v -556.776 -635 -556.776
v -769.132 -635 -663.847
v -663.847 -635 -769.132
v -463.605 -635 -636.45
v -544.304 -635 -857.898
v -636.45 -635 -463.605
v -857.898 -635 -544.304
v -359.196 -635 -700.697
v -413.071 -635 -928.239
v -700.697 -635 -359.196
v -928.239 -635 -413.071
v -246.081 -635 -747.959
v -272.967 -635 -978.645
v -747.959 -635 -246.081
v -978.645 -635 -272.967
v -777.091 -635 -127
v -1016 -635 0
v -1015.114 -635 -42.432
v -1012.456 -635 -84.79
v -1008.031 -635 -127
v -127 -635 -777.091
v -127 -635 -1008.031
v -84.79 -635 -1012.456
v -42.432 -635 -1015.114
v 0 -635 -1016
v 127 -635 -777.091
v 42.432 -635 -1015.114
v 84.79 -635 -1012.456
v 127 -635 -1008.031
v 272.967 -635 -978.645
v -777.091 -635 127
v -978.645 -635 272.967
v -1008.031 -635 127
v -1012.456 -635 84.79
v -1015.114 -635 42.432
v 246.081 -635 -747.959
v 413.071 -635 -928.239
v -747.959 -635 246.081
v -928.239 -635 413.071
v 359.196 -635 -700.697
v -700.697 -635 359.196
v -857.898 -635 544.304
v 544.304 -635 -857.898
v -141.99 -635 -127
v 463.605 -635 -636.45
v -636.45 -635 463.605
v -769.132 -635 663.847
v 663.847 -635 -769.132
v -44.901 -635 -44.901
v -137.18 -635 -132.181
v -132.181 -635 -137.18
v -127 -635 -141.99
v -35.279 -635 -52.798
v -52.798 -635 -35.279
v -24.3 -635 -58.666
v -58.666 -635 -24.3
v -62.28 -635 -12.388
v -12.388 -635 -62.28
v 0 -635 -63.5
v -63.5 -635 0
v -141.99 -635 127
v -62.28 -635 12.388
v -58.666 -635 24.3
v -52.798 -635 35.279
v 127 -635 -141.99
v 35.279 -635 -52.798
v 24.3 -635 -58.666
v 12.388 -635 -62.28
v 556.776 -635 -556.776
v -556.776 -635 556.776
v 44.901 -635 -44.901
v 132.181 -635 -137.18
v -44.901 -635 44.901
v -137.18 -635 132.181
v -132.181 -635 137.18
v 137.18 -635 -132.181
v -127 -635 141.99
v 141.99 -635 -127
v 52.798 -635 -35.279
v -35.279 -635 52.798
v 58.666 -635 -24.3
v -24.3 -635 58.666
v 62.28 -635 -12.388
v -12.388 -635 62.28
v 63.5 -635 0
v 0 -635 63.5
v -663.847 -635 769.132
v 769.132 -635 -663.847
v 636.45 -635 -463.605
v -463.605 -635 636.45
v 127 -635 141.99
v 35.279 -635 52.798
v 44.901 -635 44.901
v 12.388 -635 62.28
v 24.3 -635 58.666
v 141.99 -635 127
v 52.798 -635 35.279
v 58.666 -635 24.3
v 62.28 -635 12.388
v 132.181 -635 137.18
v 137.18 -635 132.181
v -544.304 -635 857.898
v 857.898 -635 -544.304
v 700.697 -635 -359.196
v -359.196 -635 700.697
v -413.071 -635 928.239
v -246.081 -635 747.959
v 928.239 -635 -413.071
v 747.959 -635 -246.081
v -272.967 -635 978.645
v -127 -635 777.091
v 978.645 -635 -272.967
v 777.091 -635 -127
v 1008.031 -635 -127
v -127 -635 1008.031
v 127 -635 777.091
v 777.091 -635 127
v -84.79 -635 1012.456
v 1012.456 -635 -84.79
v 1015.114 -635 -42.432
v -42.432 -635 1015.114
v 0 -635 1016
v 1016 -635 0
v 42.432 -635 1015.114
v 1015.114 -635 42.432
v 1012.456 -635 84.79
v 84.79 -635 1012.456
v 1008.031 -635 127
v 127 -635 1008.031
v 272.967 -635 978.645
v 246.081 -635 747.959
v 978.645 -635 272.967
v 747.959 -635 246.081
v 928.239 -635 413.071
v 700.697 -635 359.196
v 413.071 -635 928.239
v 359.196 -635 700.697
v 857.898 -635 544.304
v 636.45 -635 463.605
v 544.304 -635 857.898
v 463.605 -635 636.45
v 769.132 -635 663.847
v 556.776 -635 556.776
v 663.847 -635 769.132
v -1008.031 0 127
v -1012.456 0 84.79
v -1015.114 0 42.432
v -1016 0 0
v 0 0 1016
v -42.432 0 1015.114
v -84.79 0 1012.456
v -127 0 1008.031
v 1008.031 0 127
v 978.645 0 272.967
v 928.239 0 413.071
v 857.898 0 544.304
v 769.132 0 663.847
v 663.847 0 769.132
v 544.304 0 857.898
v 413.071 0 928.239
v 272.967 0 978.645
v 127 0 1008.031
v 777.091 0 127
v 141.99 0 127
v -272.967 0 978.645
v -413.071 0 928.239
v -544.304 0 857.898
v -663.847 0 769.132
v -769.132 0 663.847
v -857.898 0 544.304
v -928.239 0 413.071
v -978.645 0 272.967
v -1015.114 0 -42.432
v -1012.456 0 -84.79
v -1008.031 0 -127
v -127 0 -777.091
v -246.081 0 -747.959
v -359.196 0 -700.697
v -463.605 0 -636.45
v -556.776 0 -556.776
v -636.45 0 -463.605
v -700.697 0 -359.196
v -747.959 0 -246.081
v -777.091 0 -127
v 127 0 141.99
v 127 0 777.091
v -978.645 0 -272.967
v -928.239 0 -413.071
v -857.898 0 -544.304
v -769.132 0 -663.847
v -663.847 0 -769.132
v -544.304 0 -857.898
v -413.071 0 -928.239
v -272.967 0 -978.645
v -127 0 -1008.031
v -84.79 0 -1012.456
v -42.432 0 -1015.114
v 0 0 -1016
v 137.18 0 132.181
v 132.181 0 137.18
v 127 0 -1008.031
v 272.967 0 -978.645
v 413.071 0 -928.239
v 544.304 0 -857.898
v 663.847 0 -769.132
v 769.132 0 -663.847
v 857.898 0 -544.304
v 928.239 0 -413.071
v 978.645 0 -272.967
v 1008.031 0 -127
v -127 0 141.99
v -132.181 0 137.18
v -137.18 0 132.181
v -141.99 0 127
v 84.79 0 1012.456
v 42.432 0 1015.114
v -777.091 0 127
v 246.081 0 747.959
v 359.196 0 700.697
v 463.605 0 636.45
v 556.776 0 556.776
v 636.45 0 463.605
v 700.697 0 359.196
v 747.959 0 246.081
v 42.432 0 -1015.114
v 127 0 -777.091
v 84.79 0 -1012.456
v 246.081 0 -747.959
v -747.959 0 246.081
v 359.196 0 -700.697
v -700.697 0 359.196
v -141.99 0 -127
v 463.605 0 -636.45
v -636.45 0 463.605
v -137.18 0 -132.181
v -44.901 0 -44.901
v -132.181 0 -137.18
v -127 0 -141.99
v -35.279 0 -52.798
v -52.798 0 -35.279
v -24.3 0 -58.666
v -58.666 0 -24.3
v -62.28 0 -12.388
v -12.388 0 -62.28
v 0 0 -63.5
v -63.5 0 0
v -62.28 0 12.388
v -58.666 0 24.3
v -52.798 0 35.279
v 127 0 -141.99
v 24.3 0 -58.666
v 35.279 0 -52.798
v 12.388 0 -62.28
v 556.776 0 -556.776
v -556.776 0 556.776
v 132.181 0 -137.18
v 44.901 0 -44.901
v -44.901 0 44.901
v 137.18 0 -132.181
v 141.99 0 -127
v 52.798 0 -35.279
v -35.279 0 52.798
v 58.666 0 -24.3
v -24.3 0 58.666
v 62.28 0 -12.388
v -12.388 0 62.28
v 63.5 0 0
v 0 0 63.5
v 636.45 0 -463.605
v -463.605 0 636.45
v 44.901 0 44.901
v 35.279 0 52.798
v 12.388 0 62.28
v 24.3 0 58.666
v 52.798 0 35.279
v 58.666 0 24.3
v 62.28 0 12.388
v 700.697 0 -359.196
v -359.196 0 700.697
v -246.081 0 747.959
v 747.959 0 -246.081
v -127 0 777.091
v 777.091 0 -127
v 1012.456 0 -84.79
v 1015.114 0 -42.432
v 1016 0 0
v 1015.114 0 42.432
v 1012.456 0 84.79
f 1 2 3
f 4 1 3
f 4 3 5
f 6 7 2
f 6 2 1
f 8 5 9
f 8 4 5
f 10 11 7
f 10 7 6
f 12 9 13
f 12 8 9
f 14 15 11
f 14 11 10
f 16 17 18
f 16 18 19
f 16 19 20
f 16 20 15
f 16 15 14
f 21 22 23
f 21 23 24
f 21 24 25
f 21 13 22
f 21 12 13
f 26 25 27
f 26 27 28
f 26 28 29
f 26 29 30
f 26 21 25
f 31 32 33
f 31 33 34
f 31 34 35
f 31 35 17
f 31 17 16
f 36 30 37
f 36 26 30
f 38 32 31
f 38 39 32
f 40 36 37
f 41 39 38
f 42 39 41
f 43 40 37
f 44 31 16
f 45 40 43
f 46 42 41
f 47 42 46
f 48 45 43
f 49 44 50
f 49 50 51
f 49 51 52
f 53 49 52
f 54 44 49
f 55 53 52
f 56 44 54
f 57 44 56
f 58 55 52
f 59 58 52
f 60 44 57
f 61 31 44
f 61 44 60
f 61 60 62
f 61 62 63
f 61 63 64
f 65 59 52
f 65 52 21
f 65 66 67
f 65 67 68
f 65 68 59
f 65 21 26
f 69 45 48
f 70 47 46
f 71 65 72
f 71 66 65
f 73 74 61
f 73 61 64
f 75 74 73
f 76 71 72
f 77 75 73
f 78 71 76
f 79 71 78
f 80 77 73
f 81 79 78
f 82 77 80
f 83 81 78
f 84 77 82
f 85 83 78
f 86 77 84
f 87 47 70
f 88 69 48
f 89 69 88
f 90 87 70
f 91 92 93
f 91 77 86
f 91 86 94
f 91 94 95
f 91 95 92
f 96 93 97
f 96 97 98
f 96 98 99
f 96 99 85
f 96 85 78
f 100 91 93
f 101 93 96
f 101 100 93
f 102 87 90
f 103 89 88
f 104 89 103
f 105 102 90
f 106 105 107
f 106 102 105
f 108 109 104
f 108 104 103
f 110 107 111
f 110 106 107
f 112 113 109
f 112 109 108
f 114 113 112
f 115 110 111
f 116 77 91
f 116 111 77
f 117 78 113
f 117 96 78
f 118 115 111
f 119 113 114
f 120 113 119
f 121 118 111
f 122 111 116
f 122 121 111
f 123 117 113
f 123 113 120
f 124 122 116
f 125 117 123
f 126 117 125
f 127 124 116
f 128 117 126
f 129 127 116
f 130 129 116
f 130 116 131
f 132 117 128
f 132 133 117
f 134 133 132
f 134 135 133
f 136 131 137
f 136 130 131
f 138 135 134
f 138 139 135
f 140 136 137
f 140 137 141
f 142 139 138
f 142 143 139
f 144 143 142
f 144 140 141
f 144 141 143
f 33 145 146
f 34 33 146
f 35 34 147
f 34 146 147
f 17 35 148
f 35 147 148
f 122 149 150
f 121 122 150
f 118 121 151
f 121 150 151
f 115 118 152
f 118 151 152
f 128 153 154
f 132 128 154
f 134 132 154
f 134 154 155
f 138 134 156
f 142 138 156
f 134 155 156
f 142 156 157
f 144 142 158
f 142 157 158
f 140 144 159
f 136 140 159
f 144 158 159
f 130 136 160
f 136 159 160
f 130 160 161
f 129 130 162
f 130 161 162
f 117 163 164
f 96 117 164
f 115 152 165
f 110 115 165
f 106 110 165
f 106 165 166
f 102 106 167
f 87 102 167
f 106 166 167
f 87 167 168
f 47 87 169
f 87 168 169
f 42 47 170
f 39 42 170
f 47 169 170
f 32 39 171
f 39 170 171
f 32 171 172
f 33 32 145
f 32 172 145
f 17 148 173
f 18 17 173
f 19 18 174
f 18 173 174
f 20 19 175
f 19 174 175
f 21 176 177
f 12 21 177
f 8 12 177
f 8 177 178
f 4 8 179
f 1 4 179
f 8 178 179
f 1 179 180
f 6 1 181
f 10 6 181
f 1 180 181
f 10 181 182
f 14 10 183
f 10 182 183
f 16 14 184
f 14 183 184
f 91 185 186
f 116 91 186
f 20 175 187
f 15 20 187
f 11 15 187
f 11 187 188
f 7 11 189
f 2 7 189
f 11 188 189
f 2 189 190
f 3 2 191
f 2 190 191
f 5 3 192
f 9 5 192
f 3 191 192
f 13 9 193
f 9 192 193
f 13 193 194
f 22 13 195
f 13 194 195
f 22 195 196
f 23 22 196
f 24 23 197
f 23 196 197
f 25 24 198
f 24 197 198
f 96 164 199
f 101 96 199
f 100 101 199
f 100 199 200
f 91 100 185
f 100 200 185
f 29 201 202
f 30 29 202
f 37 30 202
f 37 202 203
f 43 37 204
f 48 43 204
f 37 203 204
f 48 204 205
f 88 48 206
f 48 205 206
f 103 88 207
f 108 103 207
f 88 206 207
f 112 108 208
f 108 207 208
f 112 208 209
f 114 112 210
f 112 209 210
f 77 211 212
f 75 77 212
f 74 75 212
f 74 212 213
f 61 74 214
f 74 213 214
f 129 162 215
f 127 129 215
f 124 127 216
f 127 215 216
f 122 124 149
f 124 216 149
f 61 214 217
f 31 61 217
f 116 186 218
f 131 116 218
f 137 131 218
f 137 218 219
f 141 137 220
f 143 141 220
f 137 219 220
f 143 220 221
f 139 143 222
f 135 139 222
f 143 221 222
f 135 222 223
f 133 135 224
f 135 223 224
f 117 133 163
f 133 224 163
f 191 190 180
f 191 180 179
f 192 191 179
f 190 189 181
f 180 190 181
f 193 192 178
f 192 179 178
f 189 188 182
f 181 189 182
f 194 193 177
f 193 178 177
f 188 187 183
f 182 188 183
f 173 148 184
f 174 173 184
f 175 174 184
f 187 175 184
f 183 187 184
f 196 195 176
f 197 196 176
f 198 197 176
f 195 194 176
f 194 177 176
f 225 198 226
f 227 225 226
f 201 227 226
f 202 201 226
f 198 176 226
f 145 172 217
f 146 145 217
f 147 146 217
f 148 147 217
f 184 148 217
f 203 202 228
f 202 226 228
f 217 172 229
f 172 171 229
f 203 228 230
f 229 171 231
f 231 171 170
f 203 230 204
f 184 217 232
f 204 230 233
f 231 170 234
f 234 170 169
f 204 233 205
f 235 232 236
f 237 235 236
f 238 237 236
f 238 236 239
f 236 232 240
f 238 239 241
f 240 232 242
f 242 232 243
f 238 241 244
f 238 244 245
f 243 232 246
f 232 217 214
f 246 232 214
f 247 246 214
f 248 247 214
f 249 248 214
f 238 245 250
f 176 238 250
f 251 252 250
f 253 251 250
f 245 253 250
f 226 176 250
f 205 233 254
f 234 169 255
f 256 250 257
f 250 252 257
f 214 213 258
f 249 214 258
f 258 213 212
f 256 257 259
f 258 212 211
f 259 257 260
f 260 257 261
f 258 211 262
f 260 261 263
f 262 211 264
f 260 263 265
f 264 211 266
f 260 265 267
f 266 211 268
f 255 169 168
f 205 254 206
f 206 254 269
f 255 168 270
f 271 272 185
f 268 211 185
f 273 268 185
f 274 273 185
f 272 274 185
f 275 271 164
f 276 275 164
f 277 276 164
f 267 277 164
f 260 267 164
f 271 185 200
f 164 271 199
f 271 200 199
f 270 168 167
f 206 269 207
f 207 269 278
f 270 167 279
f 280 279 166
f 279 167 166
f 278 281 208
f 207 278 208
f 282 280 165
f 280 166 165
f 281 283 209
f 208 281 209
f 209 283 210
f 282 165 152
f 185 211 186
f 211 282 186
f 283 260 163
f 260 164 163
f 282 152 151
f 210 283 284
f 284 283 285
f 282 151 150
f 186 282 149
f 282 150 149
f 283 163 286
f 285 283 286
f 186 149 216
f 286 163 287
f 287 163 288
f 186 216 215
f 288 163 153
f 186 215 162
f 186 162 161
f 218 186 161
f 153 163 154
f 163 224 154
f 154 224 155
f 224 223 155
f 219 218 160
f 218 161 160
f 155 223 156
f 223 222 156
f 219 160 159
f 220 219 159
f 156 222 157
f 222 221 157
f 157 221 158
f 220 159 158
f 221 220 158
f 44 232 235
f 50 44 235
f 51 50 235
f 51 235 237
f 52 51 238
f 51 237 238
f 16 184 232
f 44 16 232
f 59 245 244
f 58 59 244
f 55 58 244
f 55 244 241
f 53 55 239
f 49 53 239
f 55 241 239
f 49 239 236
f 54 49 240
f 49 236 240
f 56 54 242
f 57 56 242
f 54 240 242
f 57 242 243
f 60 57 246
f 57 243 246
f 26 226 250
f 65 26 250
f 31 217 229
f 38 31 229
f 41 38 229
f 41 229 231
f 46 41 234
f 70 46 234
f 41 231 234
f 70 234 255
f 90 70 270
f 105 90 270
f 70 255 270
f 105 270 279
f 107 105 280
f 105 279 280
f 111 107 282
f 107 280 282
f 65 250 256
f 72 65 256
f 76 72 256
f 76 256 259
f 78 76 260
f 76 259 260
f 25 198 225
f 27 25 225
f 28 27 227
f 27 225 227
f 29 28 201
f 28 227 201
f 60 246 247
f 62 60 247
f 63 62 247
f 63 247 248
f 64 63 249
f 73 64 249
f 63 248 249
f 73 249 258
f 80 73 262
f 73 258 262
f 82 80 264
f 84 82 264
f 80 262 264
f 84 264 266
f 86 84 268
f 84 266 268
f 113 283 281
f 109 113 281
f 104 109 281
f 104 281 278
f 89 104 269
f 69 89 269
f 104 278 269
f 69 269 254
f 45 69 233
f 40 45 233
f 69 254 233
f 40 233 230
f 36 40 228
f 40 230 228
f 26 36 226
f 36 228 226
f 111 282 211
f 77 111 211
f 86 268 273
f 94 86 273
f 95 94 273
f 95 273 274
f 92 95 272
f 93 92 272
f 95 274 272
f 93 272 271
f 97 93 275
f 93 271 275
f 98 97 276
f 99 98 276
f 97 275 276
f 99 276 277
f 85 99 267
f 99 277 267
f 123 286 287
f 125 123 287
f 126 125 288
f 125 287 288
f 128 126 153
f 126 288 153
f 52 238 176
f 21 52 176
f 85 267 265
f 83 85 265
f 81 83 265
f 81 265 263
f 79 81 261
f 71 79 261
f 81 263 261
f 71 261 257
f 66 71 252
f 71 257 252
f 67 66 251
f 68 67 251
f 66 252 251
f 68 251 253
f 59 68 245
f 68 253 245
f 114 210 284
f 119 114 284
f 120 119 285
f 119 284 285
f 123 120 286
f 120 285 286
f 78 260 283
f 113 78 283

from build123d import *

# Parameters (mm, degrees)
F1_DEPTH = 635


with BuildPart() as f1:
    # F0 (on Front) → F1 (new body)
    with BuildSketch(Plane.XZ):
        with BuildLine():
            Line((0, -1016), (0, -63.5))
            ThreePointArc((0, -63.5), (-44.901281, -44.901281), (-63.5, 0))
            Line((-63.5, 0), (-1016, 0))
            ThreePointArc((-1016, 0), (-1014.005855, -63.624879), (-1008.03125, -127))
            ThreePointArc((-1008.03125, -127), (-718.42049, -718.42049), (-127, -1008.03125))
            ThreePointArc((-127, -1008.03125), (-63.624879, -1014.005855), (0, -1016))
        make_face()
        with BuildLine():
            ThreePointArc((-141.990317, -127), (-134.703842, -134.703842), (-127, -141.990317))
            Line((-127, -141.990317), (-127, -777.090574))
            ThreePointArc((-127, -777.090574), (-556.77588, -556.77588), (-777.090574, -127))
            Line((-777.090574, -127), (-141.990317, -127))
        make_face(mode=Mode.SUBTRACT)
        with BuildLine():
            ThreePointArc((1008.03125, -127), (1014.005855, -63.624879), (1016, 0))
            Line((1016, 0), (63.5, 0))
            ThreePointArc((63.5, 0), (44.901281, -44.901281), (0, -63.5))
            Line((0, -63.5), (0, -1016))
            ThreePointArc((0, -1016), (63.624879, -1014.005855), (127, -1008.03125))
            ThreePointArc((127, -1008.03125), (718.42049, -718.42049), (1008.03125, -127))
        make_face()
        with BuildLine():
            Line((127, -777.090574), (127, -141.990317))
            ThreePointArc((127, -141.990317), (134.703842, -134.703842), (141.990317, -127))
            Line((141.990317, -127), (777.090574, -127))
            ThreePointArc((777.090574, -127), (556.77588, -556.77588), (127, -777.090574))
        make_face(mode=Mode.SUBTRACT)
        with BuildLine():
            ThreePointArc((-63.5, 0), (-44.901281, 44.901281), (0, 63.5))
            Line((0, 63.5), (0, 1016))
            ThreePointArc((0, 1016), (-63.624879, 1014.005855), (-127, 1008.03125))
            ThreePointArc((-127, 1008.03125), (-718.42049, 718.42049), (-1008.03125, 127))
            ThreePointArc((-1008.03125, 127), (-1014.005855, 63.624879), (-1016, 0))
            Line((-1016, 0), (-63.5, 0))
        make_face()
        with BuildLine():
            Line((-127, 777.090574), (-127, 141.990317))
            ThreePointArc((-127, 141.990317), (-134.703842, 134.703842), (-141.990317, 127))
            Line((-141.990317, 127), (-777.090574, 127))
            ThreePointArc((-777.090574, 127), (-556.77588, 556.77588), (-127, 777.090574))
        make_face(mode=Mode.SUBTRACT)
        with BuildLine():
            Line((63.5, 0), (1016, 0))
            ThreePointArc((1016, 0), (1014.005855, 63.624879), (1008.03125, 127))
            ThreePointArc((1008.03125, 127), (718.42049, 718.42049), (127, 1008.03125))
            ThreePointArc((127, 1008.03125), (63.624879, 1014.005855), (0, 1016))
            Line((0, 1016), (0, 63.5))
            ThreePointArc((0, 63.5), (44.901281, 44.901281), (63.5, 0))
        make_face()
        with BuildLine():
            Line((777.090574, 127), (141.990317, 127))
            ThreePointArc((141.990317, 127), (134.703842, 134.703842), (127, 141.990317))
            Line((127, 141.990317), (127, 777.090574))
            ThreePointArc((127, 777.090574), (556.77588, 556.77588), (777.090574, 127))
        make_face(mode=Mode.SUBTRACT)
    extrude(amount=F1_DEPTH)


solid = f1.part
